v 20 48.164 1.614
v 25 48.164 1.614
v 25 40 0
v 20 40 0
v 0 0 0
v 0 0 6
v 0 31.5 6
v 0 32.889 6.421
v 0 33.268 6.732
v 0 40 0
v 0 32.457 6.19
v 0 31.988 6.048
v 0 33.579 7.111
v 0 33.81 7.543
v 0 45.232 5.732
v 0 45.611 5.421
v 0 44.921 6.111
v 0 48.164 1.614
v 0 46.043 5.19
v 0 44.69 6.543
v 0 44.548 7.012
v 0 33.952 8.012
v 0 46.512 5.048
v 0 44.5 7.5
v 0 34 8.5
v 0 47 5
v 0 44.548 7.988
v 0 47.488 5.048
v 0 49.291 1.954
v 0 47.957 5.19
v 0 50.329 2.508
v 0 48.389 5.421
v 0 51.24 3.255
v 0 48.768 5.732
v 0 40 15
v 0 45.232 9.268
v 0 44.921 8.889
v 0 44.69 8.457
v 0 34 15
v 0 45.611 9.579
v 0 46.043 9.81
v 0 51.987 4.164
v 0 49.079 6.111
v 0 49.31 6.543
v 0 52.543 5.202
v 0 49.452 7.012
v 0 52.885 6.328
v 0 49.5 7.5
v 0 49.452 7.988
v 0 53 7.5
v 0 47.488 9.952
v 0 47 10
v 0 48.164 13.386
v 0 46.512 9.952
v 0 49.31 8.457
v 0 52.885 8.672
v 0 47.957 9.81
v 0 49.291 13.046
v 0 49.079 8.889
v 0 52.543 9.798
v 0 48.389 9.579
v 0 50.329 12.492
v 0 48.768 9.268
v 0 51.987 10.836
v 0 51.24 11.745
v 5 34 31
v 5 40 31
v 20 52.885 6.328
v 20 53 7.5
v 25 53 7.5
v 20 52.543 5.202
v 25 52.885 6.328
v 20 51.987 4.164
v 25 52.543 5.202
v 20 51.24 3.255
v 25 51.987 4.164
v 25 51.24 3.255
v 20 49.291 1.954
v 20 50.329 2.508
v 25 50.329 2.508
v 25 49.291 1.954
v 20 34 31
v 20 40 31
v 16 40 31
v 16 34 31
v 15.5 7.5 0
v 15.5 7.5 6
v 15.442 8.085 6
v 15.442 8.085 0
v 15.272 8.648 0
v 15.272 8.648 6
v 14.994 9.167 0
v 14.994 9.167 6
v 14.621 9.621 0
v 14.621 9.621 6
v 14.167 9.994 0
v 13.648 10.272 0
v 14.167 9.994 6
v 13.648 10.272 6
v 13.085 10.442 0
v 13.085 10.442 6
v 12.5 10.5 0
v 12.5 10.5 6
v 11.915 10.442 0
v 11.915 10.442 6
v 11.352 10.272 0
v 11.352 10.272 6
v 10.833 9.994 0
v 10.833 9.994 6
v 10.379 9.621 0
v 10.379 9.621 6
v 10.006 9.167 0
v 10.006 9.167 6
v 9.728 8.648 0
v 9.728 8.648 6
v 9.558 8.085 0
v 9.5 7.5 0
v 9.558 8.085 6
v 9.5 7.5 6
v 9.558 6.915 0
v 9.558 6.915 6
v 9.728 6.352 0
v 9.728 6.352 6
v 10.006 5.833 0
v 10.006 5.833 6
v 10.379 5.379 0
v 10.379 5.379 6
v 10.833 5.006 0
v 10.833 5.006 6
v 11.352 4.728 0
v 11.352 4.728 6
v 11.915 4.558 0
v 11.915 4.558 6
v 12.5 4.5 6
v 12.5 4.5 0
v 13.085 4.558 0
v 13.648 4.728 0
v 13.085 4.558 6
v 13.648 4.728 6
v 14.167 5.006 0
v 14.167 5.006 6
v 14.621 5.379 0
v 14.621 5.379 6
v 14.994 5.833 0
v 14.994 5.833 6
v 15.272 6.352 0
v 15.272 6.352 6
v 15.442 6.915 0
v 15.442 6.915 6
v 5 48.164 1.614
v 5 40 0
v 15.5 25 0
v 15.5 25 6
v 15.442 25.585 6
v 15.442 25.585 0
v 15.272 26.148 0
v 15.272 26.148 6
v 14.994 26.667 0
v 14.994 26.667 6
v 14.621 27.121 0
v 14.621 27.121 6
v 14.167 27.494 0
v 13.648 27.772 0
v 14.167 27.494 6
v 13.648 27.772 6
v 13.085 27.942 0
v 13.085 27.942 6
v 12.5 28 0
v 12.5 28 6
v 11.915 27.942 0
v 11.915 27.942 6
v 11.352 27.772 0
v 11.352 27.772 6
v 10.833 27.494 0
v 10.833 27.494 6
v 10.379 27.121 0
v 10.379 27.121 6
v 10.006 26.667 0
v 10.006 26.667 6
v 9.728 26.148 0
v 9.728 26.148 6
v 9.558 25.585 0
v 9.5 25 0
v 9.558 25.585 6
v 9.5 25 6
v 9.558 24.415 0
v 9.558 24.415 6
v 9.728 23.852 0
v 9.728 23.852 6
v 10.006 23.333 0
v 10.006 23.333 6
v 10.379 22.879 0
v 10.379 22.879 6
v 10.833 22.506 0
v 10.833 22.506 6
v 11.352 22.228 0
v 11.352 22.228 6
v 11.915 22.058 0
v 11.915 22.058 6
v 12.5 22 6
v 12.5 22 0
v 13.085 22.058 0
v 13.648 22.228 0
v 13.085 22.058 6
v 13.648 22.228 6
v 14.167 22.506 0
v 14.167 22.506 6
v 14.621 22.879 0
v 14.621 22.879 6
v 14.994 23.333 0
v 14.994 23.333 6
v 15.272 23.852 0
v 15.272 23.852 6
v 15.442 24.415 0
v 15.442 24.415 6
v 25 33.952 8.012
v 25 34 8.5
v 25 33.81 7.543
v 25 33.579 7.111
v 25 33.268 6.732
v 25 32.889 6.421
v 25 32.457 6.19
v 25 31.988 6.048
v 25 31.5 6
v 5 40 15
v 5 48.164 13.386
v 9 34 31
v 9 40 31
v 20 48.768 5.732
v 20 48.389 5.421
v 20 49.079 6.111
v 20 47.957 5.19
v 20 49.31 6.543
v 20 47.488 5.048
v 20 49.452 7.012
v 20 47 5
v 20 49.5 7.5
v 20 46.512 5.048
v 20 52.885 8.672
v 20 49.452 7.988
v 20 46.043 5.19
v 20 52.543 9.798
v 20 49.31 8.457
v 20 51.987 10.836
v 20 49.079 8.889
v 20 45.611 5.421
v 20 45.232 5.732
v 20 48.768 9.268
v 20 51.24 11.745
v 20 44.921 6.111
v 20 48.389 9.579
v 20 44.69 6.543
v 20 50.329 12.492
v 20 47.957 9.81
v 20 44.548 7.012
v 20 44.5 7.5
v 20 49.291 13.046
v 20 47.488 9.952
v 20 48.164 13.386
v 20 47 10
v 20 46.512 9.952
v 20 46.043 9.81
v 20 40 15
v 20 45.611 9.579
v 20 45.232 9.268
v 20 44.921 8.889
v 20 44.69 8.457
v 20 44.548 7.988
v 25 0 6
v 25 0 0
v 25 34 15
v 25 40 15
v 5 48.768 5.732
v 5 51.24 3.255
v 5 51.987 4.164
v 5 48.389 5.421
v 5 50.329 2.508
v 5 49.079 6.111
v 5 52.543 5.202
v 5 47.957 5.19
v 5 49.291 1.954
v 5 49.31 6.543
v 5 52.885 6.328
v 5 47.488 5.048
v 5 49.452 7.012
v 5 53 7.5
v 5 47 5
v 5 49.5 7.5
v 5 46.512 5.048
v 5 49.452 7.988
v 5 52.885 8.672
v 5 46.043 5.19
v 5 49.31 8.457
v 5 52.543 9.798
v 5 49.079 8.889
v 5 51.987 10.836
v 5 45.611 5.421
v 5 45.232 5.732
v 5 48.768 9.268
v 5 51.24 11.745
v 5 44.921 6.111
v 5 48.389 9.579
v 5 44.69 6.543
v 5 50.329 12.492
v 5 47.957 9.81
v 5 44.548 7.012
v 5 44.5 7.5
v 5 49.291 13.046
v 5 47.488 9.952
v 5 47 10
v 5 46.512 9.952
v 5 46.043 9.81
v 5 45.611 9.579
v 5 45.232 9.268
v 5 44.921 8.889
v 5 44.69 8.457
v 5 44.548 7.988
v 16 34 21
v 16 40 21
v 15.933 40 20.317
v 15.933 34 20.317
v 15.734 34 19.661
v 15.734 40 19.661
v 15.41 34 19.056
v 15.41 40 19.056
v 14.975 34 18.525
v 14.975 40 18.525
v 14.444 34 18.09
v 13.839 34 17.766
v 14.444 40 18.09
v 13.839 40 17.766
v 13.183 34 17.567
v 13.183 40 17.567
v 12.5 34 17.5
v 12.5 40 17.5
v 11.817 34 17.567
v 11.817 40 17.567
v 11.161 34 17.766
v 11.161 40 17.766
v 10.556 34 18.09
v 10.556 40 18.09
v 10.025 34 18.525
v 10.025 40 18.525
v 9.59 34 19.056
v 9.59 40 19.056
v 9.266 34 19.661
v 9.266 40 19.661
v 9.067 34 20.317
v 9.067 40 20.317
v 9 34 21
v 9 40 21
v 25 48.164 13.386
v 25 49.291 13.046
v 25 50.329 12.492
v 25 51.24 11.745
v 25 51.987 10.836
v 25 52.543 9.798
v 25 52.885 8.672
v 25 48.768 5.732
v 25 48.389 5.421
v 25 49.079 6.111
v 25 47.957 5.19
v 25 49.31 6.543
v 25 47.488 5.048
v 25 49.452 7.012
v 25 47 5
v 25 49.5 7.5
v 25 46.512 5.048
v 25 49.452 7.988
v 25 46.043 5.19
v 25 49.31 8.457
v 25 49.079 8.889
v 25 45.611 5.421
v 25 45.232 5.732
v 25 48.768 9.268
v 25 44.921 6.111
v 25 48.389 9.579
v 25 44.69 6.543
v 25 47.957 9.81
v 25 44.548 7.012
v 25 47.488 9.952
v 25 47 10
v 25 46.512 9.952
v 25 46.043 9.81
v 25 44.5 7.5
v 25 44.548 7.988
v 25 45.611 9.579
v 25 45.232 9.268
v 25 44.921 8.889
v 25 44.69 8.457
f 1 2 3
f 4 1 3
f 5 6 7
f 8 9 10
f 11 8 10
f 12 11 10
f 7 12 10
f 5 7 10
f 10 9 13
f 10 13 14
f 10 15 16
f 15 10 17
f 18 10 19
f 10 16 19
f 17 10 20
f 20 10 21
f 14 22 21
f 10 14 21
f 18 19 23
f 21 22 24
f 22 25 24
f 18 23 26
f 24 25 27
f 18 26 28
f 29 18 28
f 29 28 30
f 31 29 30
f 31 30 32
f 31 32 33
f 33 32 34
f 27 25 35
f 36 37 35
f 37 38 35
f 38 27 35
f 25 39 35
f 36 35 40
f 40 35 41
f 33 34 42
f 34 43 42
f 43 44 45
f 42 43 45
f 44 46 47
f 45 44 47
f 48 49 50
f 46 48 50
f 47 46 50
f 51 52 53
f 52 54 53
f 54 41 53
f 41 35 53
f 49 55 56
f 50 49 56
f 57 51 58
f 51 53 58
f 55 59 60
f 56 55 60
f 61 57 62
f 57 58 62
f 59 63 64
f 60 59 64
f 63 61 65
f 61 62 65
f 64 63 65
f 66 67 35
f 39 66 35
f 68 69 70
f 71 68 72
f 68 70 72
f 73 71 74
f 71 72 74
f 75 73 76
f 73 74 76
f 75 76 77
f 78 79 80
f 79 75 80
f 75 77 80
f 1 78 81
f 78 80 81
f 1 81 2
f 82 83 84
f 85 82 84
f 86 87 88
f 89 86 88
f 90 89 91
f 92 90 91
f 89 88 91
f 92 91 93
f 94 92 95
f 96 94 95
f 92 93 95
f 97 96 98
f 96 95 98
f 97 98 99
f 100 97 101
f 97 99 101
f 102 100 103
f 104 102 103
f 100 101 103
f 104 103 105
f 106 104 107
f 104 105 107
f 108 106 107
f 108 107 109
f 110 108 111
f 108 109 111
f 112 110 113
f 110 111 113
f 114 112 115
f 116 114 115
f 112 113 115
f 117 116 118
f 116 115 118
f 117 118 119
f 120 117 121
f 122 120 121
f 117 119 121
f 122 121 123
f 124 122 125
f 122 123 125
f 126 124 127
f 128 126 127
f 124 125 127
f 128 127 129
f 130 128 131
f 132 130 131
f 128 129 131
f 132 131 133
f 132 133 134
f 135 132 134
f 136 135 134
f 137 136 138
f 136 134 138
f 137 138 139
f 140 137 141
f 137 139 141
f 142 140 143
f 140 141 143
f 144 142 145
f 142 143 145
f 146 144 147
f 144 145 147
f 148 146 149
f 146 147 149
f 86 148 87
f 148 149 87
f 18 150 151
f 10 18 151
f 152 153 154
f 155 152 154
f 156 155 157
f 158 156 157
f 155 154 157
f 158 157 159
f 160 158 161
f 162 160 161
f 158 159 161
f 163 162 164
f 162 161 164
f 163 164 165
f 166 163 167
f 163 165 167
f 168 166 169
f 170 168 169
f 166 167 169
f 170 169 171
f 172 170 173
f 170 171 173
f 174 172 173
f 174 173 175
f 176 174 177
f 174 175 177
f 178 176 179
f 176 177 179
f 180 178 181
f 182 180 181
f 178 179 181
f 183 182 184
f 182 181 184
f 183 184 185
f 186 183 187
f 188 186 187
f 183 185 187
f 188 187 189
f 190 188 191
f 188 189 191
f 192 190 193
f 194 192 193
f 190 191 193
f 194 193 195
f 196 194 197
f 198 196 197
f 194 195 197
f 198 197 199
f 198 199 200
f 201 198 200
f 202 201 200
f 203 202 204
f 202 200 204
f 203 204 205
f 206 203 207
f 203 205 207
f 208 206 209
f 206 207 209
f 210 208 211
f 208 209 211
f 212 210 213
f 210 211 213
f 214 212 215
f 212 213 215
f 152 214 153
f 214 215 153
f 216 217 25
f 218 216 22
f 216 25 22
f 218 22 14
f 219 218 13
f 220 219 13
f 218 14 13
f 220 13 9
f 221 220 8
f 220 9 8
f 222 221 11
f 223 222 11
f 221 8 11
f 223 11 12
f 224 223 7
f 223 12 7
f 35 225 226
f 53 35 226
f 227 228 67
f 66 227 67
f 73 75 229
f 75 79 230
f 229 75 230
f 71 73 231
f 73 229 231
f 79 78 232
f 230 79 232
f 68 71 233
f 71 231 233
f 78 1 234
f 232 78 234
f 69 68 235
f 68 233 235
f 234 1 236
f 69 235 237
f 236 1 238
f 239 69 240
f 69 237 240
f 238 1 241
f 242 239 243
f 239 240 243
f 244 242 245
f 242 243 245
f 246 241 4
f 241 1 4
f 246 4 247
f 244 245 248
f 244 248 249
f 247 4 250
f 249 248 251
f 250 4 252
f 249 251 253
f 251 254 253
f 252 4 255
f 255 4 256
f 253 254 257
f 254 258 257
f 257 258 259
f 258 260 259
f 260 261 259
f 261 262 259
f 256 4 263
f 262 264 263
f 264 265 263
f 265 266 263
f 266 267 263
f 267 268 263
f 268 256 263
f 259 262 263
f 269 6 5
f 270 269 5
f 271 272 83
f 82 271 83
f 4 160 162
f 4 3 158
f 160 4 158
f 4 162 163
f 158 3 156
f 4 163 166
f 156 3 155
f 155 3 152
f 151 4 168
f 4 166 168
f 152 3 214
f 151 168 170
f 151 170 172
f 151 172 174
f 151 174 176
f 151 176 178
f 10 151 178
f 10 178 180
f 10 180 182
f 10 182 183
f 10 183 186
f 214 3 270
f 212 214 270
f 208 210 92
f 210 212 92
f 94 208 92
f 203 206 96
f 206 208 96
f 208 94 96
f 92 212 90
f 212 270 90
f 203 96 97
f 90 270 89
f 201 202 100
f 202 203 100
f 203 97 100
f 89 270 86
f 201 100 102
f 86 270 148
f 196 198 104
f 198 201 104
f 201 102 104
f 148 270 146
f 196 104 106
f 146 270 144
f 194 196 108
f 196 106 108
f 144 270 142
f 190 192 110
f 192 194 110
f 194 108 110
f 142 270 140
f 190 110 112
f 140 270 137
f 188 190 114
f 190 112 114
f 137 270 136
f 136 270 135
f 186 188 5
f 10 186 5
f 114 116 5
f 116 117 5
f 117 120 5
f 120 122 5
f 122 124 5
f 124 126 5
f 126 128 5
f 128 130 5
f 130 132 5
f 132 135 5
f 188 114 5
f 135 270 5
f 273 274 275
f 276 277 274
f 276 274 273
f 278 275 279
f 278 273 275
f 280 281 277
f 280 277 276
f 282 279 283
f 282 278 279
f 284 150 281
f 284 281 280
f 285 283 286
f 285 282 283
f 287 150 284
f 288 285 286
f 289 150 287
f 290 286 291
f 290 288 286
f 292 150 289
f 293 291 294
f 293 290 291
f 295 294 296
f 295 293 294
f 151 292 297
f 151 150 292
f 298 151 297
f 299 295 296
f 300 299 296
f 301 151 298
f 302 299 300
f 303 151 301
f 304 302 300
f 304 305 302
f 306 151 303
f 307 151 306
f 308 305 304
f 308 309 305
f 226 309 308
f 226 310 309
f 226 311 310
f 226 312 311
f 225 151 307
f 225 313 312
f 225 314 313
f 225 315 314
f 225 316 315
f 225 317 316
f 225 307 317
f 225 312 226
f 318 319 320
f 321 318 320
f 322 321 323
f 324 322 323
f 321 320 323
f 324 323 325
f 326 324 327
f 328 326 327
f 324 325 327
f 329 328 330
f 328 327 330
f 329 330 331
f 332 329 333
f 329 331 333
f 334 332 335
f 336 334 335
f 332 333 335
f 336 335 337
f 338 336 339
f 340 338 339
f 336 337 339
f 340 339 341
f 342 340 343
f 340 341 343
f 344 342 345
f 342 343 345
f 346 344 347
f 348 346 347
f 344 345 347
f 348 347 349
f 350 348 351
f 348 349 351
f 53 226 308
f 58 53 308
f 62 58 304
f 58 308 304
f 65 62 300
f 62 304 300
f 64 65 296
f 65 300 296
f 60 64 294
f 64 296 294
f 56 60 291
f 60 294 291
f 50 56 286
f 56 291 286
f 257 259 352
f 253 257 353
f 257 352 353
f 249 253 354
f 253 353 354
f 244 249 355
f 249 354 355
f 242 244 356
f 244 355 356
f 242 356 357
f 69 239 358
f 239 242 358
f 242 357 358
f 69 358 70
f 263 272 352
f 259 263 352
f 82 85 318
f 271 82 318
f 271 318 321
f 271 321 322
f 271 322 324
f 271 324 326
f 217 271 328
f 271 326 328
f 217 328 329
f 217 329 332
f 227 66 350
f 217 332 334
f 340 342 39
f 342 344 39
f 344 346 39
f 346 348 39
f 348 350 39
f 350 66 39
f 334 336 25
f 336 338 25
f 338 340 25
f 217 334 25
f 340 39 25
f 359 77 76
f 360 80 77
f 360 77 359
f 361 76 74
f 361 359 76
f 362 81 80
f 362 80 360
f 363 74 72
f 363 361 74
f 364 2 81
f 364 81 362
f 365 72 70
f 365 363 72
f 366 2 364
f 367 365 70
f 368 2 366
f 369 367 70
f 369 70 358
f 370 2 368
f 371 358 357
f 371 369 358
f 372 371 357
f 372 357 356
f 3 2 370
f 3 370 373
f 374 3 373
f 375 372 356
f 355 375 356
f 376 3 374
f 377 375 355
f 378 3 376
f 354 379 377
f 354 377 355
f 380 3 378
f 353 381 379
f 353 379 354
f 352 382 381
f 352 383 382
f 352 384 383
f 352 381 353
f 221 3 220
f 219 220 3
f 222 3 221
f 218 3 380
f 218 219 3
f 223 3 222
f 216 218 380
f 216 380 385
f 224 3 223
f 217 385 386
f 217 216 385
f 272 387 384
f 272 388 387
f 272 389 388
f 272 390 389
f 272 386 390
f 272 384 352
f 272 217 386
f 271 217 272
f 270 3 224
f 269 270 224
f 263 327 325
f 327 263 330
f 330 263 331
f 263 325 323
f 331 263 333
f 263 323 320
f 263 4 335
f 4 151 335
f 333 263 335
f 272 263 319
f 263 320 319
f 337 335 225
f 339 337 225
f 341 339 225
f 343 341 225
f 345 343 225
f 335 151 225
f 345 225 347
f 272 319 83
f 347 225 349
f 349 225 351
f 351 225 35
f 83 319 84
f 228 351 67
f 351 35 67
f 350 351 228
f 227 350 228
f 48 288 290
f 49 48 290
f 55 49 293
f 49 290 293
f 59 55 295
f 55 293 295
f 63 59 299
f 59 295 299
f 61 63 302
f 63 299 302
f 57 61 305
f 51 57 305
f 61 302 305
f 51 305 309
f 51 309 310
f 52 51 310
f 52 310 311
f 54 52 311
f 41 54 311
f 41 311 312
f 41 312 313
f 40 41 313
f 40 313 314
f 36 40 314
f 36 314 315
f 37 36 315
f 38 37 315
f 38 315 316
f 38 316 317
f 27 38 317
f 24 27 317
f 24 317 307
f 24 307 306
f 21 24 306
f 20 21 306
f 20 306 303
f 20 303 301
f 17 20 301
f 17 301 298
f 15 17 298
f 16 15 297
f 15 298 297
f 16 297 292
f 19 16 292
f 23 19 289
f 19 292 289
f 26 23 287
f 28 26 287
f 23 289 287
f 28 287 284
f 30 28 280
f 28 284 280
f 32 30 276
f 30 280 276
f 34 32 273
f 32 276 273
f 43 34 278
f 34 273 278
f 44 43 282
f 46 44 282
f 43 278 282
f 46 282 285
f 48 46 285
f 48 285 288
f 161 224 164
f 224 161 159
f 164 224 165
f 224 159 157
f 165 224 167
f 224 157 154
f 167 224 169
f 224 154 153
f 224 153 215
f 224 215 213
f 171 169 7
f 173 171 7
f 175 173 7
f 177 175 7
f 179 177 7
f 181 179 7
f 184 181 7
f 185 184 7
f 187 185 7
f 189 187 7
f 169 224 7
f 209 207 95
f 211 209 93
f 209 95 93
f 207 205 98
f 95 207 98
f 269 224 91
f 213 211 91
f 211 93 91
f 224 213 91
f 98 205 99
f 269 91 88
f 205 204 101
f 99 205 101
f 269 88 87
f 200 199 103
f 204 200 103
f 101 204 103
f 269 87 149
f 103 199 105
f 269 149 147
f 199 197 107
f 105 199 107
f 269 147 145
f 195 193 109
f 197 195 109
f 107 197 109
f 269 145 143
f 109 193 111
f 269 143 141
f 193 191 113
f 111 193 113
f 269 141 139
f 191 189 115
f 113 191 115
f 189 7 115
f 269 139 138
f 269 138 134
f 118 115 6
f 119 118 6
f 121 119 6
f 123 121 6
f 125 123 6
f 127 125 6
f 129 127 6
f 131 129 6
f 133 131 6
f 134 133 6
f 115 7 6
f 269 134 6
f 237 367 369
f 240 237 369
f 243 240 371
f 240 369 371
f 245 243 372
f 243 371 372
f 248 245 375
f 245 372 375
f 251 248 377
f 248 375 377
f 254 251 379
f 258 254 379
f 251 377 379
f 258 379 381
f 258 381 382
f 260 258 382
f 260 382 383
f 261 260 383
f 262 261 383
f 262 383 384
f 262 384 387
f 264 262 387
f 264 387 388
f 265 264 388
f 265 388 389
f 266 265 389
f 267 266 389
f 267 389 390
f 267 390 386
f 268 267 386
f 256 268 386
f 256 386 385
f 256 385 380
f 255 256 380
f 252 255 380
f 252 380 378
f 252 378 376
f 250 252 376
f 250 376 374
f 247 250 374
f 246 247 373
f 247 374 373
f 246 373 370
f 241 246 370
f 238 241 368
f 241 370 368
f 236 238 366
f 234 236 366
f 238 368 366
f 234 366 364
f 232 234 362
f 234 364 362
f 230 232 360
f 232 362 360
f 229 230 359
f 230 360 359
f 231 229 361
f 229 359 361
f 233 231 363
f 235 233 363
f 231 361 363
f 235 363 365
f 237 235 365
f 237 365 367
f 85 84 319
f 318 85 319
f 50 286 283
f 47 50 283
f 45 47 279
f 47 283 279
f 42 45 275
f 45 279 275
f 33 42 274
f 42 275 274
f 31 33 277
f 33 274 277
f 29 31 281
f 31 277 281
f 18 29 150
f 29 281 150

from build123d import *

# Parameters (mm, degrees)
F1_DEPTH = 25
F3_DEPTH = 6
F4_R     = 3
F5_DEPTH = 6
F6_W     = 5
F6_H     = 15
F7_DEPTH = 13
F8_R     = 2.5
F9_DEPTH = 25


with BuildPart() as f1:
    # F0 (on Right) → F1 (new body)
    with BuildSketch(Plane.YZ):
        with BuildLine():
            Line((0, 6), (0, 0))
            Line((0, 0), (40, 0))
            Line((40, 0), (40, 31))
            Line((40, 31), (34, 31))
            Line((34, 31), (34, 8.5))
            ThreePointArc((34, 8.5), (33.267767, 6.732233), (31.5, 6))
            Line((31.5, 6), (0, 6))
        make_face()
    extrude(amount=F1_DEPTH)

    # F2 (on face) → F3 (cut)
    with BuildSketch(Plane(origin=(0, 40, 0), x_dir=(-1, 0, 0), z_dir=(0, 1, 0))):
        Polygon((-25, 31), (-25, 15), (-20, 31), align=None)
        with BuildLine():
            Line((-9, 21), (-9, 31))
            Line((-9, 31), (-12.5, 31))
            Line((-12.5, 31), (-16, 31))
            Line((-16, 31), (-16, 21))
            ThreePointArc((-16, 21), (-12.5, 17.5), (-9, 21))
        make_face()
        Polygon((-5, 31), (0, 15), (0, 31), align=None)
        Polygon((-9, 31), (-5, 31), (0, 31), (0, 32), (-25, 32), (-25, 31), (-20, 31), (-16, 31), (-12.5, 31), align=None)
    extrude(amount=-F3_DEPTH, mode=Mode.SUBTRACT)

    # F4 (on face) → F5 (cut)
    with BuildSketch(Plane.XY.offset(6)):
        with Locations((12.5, 25)):
            Circle(F4_R)
        with Locations((12.5, 7.5)):
            Circle(F4_R)
    extrude(amount=-F5_DEPTH, mode=Mode.SUBTRACT)

    # F6 (on face) → F7 (join)
    with BuildSketch(Plane(origin=(0, 40, 0), x_dir=(-1, 0, 0), z_dir=(0, 1, 0))):
        with Locations((-22.5, 7.5)):
            Rectangle(F6_W, F6_H)
        with Locations((-2.5, 7.5)):
            Rectangle(F6_W, F6_H)
    extrude(amount=F7_DEPTH)

    # F8 (on face) → F9 (cut)
    with BuildSketch(Plane.YZ.offset(25)):
        with BuildLine():
            ThreePointArc((48.163654, 13.386077), (51.635835, 11.309073), (53, 7.5))
            Line((53, 7.5), (53, 15))
            Line((53, 15), (40, 15))
            Line((40, 15), (48.163654, 13.386077))
        make_face()
        with Locations((47, 7.5)):
            Circle(F8_R)
        with BuildLine():
            Line((48.163654, 1.613923), (40, 0))
            Line((40, 0), (47, 0))
            Line((47, 0), (53, 0))
            Line((53, 0), (53, 7.5))
            ThreePointArc((53, 7.5), (51.635835, 3.690927), (48.163654, 1.613923))
        make_face()
    extrude(amount=-F9_DEPTH, mode=Mode.SUBTRACT)


solid = f1.part
